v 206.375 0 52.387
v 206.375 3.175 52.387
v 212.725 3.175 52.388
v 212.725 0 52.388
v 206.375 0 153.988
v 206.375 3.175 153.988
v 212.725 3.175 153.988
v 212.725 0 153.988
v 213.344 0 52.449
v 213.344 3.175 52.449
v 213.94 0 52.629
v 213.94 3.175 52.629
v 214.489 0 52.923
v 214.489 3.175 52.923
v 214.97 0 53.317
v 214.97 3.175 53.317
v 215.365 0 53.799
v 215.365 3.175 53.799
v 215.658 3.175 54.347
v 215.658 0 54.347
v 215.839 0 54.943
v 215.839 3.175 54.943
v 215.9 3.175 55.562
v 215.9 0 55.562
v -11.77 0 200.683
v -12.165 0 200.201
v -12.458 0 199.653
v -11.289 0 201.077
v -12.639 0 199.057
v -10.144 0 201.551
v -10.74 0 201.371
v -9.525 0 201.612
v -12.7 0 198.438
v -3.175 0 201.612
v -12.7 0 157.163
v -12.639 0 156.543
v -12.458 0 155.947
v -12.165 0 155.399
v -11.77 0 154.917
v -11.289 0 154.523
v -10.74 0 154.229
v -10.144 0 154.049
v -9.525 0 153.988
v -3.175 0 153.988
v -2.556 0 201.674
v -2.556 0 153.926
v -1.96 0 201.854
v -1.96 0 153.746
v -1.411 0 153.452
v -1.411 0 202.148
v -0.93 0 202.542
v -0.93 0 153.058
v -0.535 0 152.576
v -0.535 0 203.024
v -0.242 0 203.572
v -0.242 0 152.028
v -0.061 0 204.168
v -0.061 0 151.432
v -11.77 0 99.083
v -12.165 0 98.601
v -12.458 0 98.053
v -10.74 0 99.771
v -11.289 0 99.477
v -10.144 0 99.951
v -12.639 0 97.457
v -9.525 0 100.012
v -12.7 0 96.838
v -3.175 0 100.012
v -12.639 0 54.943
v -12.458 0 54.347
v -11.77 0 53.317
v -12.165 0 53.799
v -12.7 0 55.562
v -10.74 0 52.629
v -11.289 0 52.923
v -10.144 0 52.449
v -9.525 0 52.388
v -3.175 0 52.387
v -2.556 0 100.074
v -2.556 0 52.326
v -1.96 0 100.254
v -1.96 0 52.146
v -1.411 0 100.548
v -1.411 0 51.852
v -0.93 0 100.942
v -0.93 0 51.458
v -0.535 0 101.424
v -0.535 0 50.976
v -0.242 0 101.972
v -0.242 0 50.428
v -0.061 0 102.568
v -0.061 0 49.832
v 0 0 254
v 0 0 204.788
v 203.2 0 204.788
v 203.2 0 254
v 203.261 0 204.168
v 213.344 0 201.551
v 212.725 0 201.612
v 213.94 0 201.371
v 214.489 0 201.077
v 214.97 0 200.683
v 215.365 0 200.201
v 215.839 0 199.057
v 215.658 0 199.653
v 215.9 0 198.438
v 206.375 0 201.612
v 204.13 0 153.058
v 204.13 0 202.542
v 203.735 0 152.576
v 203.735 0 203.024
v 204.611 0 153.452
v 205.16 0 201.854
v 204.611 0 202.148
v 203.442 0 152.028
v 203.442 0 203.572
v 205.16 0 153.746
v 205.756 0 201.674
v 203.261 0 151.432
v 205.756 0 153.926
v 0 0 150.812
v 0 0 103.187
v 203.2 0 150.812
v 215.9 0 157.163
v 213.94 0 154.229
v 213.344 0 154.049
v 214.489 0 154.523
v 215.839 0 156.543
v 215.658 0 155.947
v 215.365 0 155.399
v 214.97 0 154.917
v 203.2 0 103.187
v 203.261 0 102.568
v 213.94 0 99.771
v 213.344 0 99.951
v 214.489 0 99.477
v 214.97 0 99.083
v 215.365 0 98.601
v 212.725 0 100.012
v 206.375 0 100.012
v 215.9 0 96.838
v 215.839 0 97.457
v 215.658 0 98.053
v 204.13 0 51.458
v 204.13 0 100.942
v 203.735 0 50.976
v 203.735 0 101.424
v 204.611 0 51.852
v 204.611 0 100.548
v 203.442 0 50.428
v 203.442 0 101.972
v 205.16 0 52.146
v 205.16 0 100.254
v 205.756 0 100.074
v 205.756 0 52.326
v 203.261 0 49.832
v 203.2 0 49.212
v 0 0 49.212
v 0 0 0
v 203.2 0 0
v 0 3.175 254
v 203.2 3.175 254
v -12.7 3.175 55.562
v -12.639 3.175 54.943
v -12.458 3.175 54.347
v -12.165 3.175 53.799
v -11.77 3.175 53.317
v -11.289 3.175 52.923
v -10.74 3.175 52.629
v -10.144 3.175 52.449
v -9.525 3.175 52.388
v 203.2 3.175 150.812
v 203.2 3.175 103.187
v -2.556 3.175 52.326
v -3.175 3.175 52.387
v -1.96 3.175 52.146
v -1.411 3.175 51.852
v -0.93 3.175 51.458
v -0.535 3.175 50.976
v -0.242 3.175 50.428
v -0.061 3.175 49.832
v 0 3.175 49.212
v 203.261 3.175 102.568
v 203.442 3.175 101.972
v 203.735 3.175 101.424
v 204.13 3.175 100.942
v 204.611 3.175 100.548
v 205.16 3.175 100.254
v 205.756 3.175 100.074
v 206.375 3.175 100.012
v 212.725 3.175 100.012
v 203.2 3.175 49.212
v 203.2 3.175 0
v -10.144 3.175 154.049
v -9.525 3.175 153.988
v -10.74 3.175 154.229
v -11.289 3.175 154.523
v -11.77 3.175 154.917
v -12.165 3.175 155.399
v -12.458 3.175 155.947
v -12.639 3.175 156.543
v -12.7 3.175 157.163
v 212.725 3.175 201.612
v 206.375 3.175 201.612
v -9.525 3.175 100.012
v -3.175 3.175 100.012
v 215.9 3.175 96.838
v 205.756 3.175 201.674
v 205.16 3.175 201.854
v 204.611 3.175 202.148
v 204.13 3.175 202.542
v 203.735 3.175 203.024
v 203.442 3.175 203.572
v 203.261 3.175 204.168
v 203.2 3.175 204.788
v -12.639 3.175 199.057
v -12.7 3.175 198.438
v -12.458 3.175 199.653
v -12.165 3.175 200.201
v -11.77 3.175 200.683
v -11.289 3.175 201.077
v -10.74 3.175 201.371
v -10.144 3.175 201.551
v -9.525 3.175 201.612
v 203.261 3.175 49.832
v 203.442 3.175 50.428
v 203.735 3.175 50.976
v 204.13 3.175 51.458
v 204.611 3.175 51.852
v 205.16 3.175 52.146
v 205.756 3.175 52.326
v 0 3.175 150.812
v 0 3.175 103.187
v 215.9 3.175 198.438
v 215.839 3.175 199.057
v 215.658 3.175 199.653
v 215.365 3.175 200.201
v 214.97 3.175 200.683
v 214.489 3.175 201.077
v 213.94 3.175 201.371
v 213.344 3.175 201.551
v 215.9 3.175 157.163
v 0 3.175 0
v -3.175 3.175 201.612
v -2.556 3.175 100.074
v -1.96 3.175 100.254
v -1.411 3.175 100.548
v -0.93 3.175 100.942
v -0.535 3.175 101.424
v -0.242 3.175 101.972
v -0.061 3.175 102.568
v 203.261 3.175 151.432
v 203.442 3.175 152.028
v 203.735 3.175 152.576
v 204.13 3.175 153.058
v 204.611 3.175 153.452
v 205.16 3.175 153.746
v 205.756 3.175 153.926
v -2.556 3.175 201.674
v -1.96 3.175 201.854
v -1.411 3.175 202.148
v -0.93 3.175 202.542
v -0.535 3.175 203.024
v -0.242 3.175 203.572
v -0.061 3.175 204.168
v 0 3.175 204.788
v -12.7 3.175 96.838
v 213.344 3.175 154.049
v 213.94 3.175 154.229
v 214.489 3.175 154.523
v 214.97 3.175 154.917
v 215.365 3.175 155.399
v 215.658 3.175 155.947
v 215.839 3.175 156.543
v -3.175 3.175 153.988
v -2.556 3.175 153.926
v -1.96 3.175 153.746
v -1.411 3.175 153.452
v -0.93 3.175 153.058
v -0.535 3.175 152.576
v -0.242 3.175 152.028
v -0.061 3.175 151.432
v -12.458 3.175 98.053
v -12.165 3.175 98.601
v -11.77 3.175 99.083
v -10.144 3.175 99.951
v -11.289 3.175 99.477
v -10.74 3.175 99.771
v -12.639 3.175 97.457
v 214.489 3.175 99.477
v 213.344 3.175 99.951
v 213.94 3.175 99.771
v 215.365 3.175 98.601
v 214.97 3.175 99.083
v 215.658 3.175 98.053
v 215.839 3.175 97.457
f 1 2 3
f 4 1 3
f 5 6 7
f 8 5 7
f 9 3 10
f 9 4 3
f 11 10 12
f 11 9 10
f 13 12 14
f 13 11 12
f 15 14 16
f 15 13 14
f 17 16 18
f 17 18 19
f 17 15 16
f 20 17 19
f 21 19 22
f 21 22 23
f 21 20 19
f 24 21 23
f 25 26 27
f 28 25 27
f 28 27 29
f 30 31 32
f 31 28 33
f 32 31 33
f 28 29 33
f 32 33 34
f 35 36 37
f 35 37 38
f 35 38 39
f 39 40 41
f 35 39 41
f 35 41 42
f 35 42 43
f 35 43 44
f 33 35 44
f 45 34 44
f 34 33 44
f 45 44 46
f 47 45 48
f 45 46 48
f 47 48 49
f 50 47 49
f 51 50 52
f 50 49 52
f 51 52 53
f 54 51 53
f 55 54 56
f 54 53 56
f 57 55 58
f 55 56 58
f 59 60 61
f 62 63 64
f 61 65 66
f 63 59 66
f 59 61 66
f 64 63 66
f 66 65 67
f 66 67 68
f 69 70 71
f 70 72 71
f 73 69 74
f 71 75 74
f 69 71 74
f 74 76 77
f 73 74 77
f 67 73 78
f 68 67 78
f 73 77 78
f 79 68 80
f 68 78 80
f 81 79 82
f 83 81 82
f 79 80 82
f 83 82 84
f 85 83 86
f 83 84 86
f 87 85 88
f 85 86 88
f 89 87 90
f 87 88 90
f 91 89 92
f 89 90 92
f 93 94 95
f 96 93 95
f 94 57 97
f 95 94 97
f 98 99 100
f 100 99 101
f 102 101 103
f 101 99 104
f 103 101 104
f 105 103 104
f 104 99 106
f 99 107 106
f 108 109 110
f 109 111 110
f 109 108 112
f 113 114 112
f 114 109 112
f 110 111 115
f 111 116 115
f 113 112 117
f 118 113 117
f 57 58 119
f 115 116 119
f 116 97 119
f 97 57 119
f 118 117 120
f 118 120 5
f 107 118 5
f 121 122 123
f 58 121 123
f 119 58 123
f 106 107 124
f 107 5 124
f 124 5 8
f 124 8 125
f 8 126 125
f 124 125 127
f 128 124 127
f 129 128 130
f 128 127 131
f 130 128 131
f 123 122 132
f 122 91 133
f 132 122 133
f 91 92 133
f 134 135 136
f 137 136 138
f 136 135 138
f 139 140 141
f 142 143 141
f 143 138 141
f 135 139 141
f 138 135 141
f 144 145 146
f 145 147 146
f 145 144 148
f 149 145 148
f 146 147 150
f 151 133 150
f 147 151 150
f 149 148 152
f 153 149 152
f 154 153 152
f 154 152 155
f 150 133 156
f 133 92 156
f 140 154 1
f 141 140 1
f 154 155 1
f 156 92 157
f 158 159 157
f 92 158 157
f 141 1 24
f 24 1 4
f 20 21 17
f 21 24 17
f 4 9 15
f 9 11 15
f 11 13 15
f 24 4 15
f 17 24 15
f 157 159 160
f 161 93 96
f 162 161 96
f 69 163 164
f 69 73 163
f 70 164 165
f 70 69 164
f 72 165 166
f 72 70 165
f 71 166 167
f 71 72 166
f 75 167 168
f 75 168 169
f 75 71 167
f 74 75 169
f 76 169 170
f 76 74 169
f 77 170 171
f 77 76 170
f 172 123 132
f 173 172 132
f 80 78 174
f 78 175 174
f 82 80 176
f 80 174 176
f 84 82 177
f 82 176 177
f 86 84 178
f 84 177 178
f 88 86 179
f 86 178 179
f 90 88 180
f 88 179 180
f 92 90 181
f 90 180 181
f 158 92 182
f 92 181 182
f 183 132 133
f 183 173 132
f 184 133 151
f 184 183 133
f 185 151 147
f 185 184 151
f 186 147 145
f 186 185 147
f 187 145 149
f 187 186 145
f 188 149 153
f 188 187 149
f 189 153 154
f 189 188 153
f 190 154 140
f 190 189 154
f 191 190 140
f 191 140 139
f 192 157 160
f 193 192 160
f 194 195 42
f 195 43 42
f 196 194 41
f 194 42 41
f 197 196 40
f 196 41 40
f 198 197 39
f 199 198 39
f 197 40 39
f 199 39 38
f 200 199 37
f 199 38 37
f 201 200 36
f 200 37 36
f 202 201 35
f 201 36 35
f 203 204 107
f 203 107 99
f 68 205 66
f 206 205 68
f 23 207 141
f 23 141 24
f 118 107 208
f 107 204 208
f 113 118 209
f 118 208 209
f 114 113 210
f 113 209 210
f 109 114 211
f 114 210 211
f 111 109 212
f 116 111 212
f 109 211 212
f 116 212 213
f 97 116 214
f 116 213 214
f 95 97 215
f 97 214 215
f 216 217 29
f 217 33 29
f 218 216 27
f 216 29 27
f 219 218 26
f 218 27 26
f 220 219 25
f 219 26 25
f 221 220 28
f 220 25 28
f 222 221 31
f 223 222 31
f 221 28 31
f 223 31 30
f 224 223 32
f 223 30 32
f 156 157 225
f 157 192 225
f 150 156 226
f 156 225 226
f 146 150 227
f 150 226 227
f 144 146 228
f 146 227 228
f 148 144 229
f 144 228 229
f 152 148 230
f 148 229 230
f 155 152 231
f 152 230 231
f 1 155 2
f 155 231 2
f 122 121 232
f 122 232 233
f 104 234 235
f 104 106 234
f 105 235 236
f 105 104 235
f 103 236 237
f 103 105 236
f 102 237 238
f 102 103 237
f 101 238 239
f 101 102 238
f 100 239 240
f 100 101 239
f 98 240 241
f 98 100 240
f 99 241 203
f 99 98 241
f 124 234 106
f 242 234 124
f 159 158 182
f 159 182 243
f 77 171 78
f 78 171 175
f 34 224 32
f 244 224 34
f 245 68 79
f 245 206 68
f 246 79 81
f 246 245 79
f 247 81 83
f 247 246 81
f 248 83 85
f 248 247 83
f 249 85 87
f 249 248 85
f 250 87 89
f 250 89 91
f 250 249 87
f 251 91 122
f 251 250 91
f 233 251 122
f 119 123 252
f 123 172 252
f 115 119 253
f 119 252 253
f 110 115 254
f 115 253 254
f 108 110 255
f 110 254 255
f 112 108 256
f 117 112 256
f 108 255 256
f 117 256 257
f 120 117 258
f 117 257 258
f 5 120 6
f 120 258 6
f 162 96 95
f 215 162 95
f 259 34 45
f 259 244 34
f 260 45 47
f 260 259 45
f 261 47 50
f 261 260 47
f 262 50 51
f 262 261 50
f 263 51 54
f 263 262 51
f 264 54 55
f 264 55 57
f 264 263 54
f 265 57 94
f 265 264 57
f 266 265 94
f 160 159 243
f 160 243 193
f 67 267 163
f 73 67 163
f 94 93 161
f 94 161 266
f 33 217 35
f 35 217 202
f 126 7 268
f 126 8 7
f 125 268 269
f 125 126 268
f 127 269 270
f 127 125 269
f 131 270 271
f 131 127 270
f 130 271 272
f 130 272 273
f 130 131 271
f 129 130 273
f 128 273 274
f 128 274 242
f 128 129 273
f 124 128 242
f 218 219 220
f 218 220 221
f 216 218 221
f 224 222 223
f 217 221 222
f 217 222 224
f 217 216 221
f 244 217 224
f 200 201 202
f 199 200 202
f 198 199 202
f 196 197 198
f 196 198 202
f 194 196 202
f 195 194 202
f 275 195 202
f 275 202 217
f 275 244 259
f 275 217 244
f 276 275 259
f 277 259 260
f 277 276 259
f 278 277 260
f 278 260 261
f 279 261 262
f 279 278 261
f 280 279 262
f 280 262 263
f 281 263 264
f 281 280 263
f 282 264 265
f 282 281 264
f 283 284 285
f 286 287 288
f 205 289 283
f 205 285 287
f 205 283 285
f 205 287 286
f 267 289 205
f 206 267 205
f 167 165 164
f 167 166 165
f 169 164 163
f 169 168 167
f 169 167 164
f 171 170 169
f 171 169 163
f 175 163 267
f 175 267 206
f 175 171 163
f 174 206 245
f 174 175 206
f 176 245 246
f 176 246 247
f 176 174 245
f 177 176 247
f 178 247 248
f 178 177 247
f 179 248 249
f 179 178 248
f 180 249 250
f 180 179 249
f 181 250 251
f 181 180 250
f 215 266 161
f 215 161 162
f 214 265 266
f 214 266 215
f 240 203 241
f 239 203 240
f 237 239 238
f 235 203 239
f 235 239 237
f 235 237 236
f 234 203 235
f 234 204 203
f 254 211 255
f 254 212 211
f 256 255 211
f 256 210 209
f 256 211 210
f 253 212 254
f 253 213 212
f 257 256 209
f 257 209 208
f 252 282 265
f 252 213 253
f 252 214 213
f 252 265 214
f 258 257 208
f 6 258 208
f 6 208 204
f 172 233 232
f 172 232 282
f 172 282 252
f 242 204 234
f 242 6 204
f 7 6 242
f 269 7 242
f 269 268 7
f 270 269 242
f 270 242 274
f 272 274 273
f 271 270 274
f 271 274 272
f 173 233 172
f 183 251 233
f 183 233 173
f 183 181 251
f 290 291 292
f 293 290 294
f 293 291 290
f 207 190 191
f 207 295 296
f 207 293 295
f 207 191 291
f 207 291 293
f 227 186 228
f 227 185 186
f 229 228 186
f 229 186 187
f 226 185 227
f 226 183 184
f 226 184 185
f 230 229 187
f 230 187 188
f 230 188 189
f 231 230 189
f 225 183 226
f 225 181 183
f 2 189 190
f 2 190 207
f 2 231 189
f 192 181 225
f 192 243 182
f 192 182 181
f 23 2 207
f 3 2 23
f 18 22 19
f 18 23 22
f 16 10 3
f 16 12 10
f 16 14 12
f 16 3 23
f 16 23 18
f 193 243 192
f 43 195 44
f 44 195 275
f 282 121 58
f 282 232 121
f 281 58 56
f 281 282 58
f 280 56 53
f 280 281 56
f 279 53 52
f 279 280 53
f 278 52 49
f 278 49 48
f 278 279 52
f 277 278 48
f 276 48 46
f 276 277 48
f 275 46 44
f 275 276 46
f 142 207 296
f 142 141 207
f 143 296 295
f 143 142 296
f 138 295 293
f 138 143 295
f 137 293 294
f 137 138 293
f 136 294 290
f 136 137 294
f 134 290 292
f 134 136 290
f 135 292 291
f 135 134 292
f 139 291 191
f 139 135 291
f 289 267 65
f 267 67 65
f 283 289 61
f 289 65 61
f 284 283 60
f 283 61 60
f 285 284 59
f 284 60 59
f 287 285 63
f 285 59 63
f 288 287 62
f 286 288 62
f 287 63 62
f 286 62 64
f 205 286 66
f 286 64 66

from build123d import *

# Parameters (mm, degrees)
SKETCH1_W           = 203.2
SKETCH1_H           = 254
BOSS_EXTRUDE1_DEPTH = 3.175
SKETCH2_W           = 228.6
SKETCH2_H           = 47.625
BOSS_EXTRUDE2_DEPTH = 3.175
FILLET1_R           = 3.175


with BuildPart() as part:
    # Sketch1 → Boss-Extrude1 (new body)
    with BuildSketch(Plane(origin=(0, 0, 0), x_dir=(1, 0, 0), z_dir=(0, 1, 0))):
        with Locations((101.6, -127)):
            Rectangle(SKETCH1_W, SKETCH1_H)
    extrude(amount=BOSS_EXTRUDE1_DEPTH)

    # Sketch2 → Boss-Extrude2 (add, through all)
    with BuildSketch(Plane(origin=(0, 3.175, 0), x_dir=(1, 0, 0), z_dir=(0, 1, 0))):
        with Locations((101.6, -76.2)):
            Rectangle(SKETCH2_W, SKETCH2_H)
        with Locations((101.6, -177.8)):
            Rectangle(SKETCH2_W, SKETCH2_H)
    extrude(amount=-BOSS_EXTRUDE2_DEPTH)

    # Fillet1
    fillet1_edges = [part.edges().sort_by_distance(p)[0] for p in [
        (215.9, 1.5875, 100.0125),
        (-12.7, 1.5875, 52.3875),
        (215.9, 1.5875, 52.3875),
        (0, 1.5875, 100.0125),
        (203.2, 1.5875, 100.0125),
        (-12.7, 1.5875, 100.0125),
        (0, 1.5875, 52.3875),
        (203.2, 1.5875, 52.3875),
        (215.9, 1.5875, 201.6125),
        (-12.7, 1.5875, 153.9875),
        (215.9, 1.5875, 153.9875),
        (0, 1.5875, 201.6125),
        (203.2, 1.5875, 201.6125),
        (-12.7, 1.5875, 201.6125),
        (0, 1.5875, 153.9875),
        (203.2, 1.5875, 153.9875),
    ]]
    fillet(fillet1_edges, radius=FILLET1_R)


solid = part.part
